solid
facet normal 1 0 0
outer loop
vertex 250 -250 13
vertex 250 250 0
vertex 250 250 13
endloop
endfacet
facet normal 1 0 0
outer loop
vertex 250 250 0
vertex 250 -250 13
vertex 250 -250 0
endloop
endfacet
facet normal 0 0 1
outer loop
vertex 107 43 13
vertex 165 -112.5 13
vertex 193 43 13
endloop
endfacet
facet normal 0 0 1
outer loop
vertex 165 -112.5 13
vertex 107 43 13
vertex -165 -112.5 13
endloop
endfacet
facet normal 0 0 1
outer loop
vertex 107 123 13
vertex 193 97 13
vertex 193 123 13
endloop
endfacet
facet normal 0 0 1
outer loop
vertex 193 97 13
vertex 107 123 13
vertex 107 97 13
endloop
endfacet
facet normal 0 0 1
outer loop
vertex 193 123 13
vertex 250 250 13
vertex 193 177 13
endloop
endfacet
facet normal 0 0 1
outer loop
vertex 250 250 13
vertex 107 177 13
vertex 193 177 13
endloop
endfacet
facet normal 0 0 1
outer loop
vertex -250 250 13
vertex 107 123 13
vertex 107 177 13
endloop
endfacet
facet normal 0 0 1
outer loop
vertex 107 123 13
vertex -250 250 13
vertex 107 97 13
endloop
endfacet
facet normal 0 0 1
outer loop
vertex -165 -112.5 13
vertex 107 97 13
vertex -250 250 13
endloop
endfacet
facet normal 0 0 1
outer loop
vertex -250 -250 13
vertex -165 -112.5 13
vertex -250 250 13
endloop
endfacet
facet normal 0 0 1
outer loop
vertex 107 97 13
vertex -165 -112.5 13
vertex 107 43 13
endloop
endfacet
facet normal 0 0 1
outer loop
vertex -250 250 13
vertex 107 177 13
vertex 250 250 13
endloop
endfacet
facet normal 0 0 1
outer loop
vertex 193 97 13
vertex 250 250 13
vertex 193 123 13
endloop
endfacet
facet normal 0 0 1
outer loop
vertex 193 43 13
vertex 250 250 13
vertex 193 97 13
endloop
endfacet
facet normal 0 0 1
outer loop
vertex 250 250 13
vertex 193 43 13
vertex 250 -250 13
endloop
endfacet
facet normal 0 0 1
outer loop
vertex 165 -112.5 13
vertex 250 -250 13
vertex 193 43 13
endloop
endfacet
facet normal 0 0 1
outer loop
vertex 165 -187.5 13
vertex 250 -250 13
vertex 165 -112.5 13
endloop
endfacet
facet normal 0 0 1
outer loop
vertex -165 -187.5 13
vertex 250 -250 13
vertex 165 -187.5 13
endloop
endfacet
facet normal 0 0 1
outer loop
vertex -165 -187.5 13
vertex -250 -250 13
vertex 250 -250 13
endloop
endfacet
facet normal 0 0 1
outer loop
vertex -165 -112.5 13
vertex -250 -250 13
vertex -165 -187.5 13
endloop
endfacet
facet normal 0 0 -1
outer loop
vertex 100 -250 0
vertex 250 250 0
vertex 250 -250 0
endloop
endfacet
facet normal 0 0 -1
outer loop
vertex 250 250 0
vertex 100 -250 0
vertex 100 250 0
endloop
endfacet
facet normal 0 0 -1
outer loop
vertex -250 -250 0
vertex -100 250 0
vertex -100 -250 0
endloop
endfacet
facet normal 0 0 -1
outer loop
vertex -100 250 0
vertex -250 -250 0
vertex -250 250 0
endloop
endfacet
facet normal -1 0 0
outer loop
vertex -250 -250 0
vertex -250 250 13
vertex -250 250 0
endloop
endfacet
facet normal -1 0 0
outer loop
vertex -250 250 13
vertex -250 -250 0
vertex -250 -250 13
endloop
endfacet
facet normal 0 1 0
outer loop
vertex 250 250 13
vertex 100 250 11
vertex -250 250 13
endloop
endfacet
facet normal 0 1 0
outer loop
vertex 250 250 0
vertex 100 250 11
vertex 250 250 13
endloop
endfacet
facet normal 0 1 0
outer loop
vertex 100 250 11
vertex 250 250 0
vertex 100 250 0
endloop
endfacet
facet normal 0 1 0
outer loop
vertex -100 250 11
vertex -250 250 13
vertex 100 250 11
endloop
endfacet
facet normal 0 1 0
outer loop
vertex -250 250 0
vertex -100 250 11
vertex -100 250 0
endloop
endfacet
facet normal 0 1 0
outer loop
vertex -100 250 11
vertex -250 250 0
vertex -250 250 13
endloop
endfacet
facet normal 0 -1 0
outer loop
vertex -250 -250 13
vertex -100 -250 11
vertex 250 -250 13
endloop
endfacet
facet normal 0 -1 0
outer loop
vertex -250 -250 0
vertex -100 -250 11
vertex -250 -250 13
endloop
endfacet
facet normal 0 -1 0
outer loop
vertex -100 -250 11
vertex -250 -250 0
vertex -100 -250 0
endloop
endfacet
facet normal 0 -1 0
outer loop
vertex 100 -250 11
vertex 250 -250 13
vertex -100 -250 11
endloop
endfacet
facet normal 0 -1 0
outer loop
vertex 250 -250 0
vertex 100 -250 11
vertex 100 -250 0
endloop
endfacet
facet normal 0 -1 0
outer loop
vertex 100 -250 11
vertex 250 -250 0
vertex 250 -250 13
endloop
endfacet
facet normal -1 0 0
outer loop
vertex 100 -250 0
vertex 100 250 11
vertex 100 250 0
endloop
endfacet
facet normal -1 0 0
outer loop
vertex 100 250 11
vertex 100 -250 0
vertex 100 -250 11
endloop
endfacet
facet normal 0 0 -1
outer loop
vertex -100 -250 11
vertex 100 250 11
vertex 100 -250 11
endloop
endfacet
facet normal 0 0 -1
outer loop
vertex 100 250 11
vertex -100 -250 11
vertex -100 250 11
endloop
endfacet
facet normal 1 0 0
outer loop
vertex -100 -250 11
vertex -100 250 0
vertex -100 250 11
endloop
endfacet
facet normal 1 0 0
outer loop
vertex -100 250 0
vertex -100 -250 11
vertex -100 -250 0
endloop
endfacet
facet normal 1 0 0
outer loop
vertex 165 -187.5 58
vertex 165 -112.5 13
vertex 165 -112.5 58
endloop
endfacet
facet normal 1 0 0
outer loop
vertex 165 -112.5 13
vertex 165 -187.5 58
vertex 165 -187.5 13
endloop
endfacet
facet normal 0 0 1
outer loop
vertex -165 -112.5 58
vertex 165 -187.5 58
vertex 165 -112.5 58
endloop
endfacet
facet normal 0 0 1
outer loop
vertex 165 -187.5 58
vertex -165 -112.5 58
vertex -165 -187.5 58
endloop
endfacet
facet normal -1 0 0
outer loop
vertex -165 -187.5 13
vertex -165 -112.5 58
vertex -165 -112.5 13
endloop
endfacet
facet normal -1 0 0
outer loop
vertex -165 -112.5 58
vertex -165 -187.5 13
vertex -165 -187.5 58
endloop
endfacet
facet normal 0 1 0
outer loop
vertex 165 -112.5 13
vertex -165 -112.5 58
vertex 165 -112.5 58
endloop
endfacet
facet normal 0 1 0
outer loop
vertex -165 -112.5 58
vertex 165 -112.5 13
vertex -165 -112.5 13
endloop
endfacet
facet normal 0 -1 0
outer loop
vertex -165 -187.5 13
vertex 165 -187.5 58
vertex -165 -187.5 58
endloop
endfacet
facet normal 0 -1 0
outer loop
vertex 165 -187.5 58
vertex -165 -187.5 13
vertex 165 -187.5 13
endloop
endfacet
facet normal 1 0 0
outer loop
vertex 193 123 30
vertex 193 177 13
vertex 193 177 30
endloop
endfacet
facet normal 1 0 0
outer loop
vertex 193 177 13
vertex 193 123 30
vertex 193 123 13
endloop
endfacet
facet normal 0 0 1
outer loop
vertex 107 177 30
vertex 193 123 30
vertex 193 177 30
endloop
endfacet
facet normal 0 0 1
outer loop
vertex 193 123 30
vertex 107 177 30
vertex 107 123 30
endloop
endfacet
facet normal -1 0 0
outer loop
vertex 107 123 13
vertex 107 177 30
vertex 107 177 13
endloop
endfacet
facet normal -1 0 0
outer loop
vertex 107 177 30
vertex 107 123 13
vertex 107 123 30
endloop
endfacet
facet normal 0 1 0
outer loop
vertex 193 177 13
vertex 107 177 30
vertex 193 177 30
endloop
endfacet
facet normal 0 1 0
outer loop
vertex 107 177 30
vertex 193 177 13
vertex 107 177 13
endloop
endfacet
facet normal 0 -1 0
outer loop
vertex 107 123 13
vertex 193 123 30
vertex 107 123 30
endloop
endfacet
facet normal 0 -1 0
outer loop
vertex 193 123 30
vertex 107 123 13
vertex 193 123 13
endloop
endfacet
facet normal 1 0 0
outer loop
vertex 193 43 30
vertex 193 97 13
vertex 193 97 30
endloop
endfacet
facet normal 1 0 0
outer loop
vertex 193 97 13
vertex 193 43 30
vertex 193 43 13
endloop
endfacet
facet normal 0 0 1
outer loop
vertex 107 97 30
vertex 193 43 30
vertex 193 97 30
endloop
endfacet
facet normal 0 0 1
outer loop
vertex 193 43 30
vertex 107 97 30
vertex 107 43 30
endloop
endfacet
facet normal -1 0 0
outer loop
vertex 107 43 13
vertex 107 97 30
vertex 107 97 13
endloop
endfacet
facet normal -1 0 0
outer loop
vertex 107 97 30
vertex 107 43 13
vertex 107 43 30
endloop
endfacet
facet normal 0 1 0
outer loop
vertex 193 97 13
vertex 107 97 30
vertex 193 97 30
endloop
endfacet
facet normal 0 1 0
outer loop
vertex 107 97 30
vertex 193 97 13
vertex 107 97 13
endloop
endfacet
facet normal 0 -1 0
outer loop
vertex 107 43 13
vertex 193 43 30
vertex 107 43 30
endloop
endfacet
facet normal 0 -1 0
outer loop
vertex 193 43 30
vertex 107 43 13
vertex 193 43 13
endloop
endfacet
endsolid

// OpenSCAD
module ControlModule(lod=0){
    // base
    translate([0, 0, 13/2]){
        difference(){
            cube([500, 500, 13], center=true); 
            translate([0,0,-(15-13)/2-2])
            cube([200, 600, 15], center=true);
        }
        
        // ABOVE PLATE
        translate([0,0,13/2]){
            // battery
            color([1, 0, 0])
            translate([0, -150, 45/2])
            cube([330, 75, 45], center=true); 
            
            
            // raspberry
            translate([150, 150, 17/2])
            color([0, 1, 0])
            cube([86, 54, 17], center=true);
            
            translate([150, 70, 17/2])
            color([0, 0, 1])
            cube([86, 54, 17], center=true);
        }
    }
}



ControlModule(lod=0);
